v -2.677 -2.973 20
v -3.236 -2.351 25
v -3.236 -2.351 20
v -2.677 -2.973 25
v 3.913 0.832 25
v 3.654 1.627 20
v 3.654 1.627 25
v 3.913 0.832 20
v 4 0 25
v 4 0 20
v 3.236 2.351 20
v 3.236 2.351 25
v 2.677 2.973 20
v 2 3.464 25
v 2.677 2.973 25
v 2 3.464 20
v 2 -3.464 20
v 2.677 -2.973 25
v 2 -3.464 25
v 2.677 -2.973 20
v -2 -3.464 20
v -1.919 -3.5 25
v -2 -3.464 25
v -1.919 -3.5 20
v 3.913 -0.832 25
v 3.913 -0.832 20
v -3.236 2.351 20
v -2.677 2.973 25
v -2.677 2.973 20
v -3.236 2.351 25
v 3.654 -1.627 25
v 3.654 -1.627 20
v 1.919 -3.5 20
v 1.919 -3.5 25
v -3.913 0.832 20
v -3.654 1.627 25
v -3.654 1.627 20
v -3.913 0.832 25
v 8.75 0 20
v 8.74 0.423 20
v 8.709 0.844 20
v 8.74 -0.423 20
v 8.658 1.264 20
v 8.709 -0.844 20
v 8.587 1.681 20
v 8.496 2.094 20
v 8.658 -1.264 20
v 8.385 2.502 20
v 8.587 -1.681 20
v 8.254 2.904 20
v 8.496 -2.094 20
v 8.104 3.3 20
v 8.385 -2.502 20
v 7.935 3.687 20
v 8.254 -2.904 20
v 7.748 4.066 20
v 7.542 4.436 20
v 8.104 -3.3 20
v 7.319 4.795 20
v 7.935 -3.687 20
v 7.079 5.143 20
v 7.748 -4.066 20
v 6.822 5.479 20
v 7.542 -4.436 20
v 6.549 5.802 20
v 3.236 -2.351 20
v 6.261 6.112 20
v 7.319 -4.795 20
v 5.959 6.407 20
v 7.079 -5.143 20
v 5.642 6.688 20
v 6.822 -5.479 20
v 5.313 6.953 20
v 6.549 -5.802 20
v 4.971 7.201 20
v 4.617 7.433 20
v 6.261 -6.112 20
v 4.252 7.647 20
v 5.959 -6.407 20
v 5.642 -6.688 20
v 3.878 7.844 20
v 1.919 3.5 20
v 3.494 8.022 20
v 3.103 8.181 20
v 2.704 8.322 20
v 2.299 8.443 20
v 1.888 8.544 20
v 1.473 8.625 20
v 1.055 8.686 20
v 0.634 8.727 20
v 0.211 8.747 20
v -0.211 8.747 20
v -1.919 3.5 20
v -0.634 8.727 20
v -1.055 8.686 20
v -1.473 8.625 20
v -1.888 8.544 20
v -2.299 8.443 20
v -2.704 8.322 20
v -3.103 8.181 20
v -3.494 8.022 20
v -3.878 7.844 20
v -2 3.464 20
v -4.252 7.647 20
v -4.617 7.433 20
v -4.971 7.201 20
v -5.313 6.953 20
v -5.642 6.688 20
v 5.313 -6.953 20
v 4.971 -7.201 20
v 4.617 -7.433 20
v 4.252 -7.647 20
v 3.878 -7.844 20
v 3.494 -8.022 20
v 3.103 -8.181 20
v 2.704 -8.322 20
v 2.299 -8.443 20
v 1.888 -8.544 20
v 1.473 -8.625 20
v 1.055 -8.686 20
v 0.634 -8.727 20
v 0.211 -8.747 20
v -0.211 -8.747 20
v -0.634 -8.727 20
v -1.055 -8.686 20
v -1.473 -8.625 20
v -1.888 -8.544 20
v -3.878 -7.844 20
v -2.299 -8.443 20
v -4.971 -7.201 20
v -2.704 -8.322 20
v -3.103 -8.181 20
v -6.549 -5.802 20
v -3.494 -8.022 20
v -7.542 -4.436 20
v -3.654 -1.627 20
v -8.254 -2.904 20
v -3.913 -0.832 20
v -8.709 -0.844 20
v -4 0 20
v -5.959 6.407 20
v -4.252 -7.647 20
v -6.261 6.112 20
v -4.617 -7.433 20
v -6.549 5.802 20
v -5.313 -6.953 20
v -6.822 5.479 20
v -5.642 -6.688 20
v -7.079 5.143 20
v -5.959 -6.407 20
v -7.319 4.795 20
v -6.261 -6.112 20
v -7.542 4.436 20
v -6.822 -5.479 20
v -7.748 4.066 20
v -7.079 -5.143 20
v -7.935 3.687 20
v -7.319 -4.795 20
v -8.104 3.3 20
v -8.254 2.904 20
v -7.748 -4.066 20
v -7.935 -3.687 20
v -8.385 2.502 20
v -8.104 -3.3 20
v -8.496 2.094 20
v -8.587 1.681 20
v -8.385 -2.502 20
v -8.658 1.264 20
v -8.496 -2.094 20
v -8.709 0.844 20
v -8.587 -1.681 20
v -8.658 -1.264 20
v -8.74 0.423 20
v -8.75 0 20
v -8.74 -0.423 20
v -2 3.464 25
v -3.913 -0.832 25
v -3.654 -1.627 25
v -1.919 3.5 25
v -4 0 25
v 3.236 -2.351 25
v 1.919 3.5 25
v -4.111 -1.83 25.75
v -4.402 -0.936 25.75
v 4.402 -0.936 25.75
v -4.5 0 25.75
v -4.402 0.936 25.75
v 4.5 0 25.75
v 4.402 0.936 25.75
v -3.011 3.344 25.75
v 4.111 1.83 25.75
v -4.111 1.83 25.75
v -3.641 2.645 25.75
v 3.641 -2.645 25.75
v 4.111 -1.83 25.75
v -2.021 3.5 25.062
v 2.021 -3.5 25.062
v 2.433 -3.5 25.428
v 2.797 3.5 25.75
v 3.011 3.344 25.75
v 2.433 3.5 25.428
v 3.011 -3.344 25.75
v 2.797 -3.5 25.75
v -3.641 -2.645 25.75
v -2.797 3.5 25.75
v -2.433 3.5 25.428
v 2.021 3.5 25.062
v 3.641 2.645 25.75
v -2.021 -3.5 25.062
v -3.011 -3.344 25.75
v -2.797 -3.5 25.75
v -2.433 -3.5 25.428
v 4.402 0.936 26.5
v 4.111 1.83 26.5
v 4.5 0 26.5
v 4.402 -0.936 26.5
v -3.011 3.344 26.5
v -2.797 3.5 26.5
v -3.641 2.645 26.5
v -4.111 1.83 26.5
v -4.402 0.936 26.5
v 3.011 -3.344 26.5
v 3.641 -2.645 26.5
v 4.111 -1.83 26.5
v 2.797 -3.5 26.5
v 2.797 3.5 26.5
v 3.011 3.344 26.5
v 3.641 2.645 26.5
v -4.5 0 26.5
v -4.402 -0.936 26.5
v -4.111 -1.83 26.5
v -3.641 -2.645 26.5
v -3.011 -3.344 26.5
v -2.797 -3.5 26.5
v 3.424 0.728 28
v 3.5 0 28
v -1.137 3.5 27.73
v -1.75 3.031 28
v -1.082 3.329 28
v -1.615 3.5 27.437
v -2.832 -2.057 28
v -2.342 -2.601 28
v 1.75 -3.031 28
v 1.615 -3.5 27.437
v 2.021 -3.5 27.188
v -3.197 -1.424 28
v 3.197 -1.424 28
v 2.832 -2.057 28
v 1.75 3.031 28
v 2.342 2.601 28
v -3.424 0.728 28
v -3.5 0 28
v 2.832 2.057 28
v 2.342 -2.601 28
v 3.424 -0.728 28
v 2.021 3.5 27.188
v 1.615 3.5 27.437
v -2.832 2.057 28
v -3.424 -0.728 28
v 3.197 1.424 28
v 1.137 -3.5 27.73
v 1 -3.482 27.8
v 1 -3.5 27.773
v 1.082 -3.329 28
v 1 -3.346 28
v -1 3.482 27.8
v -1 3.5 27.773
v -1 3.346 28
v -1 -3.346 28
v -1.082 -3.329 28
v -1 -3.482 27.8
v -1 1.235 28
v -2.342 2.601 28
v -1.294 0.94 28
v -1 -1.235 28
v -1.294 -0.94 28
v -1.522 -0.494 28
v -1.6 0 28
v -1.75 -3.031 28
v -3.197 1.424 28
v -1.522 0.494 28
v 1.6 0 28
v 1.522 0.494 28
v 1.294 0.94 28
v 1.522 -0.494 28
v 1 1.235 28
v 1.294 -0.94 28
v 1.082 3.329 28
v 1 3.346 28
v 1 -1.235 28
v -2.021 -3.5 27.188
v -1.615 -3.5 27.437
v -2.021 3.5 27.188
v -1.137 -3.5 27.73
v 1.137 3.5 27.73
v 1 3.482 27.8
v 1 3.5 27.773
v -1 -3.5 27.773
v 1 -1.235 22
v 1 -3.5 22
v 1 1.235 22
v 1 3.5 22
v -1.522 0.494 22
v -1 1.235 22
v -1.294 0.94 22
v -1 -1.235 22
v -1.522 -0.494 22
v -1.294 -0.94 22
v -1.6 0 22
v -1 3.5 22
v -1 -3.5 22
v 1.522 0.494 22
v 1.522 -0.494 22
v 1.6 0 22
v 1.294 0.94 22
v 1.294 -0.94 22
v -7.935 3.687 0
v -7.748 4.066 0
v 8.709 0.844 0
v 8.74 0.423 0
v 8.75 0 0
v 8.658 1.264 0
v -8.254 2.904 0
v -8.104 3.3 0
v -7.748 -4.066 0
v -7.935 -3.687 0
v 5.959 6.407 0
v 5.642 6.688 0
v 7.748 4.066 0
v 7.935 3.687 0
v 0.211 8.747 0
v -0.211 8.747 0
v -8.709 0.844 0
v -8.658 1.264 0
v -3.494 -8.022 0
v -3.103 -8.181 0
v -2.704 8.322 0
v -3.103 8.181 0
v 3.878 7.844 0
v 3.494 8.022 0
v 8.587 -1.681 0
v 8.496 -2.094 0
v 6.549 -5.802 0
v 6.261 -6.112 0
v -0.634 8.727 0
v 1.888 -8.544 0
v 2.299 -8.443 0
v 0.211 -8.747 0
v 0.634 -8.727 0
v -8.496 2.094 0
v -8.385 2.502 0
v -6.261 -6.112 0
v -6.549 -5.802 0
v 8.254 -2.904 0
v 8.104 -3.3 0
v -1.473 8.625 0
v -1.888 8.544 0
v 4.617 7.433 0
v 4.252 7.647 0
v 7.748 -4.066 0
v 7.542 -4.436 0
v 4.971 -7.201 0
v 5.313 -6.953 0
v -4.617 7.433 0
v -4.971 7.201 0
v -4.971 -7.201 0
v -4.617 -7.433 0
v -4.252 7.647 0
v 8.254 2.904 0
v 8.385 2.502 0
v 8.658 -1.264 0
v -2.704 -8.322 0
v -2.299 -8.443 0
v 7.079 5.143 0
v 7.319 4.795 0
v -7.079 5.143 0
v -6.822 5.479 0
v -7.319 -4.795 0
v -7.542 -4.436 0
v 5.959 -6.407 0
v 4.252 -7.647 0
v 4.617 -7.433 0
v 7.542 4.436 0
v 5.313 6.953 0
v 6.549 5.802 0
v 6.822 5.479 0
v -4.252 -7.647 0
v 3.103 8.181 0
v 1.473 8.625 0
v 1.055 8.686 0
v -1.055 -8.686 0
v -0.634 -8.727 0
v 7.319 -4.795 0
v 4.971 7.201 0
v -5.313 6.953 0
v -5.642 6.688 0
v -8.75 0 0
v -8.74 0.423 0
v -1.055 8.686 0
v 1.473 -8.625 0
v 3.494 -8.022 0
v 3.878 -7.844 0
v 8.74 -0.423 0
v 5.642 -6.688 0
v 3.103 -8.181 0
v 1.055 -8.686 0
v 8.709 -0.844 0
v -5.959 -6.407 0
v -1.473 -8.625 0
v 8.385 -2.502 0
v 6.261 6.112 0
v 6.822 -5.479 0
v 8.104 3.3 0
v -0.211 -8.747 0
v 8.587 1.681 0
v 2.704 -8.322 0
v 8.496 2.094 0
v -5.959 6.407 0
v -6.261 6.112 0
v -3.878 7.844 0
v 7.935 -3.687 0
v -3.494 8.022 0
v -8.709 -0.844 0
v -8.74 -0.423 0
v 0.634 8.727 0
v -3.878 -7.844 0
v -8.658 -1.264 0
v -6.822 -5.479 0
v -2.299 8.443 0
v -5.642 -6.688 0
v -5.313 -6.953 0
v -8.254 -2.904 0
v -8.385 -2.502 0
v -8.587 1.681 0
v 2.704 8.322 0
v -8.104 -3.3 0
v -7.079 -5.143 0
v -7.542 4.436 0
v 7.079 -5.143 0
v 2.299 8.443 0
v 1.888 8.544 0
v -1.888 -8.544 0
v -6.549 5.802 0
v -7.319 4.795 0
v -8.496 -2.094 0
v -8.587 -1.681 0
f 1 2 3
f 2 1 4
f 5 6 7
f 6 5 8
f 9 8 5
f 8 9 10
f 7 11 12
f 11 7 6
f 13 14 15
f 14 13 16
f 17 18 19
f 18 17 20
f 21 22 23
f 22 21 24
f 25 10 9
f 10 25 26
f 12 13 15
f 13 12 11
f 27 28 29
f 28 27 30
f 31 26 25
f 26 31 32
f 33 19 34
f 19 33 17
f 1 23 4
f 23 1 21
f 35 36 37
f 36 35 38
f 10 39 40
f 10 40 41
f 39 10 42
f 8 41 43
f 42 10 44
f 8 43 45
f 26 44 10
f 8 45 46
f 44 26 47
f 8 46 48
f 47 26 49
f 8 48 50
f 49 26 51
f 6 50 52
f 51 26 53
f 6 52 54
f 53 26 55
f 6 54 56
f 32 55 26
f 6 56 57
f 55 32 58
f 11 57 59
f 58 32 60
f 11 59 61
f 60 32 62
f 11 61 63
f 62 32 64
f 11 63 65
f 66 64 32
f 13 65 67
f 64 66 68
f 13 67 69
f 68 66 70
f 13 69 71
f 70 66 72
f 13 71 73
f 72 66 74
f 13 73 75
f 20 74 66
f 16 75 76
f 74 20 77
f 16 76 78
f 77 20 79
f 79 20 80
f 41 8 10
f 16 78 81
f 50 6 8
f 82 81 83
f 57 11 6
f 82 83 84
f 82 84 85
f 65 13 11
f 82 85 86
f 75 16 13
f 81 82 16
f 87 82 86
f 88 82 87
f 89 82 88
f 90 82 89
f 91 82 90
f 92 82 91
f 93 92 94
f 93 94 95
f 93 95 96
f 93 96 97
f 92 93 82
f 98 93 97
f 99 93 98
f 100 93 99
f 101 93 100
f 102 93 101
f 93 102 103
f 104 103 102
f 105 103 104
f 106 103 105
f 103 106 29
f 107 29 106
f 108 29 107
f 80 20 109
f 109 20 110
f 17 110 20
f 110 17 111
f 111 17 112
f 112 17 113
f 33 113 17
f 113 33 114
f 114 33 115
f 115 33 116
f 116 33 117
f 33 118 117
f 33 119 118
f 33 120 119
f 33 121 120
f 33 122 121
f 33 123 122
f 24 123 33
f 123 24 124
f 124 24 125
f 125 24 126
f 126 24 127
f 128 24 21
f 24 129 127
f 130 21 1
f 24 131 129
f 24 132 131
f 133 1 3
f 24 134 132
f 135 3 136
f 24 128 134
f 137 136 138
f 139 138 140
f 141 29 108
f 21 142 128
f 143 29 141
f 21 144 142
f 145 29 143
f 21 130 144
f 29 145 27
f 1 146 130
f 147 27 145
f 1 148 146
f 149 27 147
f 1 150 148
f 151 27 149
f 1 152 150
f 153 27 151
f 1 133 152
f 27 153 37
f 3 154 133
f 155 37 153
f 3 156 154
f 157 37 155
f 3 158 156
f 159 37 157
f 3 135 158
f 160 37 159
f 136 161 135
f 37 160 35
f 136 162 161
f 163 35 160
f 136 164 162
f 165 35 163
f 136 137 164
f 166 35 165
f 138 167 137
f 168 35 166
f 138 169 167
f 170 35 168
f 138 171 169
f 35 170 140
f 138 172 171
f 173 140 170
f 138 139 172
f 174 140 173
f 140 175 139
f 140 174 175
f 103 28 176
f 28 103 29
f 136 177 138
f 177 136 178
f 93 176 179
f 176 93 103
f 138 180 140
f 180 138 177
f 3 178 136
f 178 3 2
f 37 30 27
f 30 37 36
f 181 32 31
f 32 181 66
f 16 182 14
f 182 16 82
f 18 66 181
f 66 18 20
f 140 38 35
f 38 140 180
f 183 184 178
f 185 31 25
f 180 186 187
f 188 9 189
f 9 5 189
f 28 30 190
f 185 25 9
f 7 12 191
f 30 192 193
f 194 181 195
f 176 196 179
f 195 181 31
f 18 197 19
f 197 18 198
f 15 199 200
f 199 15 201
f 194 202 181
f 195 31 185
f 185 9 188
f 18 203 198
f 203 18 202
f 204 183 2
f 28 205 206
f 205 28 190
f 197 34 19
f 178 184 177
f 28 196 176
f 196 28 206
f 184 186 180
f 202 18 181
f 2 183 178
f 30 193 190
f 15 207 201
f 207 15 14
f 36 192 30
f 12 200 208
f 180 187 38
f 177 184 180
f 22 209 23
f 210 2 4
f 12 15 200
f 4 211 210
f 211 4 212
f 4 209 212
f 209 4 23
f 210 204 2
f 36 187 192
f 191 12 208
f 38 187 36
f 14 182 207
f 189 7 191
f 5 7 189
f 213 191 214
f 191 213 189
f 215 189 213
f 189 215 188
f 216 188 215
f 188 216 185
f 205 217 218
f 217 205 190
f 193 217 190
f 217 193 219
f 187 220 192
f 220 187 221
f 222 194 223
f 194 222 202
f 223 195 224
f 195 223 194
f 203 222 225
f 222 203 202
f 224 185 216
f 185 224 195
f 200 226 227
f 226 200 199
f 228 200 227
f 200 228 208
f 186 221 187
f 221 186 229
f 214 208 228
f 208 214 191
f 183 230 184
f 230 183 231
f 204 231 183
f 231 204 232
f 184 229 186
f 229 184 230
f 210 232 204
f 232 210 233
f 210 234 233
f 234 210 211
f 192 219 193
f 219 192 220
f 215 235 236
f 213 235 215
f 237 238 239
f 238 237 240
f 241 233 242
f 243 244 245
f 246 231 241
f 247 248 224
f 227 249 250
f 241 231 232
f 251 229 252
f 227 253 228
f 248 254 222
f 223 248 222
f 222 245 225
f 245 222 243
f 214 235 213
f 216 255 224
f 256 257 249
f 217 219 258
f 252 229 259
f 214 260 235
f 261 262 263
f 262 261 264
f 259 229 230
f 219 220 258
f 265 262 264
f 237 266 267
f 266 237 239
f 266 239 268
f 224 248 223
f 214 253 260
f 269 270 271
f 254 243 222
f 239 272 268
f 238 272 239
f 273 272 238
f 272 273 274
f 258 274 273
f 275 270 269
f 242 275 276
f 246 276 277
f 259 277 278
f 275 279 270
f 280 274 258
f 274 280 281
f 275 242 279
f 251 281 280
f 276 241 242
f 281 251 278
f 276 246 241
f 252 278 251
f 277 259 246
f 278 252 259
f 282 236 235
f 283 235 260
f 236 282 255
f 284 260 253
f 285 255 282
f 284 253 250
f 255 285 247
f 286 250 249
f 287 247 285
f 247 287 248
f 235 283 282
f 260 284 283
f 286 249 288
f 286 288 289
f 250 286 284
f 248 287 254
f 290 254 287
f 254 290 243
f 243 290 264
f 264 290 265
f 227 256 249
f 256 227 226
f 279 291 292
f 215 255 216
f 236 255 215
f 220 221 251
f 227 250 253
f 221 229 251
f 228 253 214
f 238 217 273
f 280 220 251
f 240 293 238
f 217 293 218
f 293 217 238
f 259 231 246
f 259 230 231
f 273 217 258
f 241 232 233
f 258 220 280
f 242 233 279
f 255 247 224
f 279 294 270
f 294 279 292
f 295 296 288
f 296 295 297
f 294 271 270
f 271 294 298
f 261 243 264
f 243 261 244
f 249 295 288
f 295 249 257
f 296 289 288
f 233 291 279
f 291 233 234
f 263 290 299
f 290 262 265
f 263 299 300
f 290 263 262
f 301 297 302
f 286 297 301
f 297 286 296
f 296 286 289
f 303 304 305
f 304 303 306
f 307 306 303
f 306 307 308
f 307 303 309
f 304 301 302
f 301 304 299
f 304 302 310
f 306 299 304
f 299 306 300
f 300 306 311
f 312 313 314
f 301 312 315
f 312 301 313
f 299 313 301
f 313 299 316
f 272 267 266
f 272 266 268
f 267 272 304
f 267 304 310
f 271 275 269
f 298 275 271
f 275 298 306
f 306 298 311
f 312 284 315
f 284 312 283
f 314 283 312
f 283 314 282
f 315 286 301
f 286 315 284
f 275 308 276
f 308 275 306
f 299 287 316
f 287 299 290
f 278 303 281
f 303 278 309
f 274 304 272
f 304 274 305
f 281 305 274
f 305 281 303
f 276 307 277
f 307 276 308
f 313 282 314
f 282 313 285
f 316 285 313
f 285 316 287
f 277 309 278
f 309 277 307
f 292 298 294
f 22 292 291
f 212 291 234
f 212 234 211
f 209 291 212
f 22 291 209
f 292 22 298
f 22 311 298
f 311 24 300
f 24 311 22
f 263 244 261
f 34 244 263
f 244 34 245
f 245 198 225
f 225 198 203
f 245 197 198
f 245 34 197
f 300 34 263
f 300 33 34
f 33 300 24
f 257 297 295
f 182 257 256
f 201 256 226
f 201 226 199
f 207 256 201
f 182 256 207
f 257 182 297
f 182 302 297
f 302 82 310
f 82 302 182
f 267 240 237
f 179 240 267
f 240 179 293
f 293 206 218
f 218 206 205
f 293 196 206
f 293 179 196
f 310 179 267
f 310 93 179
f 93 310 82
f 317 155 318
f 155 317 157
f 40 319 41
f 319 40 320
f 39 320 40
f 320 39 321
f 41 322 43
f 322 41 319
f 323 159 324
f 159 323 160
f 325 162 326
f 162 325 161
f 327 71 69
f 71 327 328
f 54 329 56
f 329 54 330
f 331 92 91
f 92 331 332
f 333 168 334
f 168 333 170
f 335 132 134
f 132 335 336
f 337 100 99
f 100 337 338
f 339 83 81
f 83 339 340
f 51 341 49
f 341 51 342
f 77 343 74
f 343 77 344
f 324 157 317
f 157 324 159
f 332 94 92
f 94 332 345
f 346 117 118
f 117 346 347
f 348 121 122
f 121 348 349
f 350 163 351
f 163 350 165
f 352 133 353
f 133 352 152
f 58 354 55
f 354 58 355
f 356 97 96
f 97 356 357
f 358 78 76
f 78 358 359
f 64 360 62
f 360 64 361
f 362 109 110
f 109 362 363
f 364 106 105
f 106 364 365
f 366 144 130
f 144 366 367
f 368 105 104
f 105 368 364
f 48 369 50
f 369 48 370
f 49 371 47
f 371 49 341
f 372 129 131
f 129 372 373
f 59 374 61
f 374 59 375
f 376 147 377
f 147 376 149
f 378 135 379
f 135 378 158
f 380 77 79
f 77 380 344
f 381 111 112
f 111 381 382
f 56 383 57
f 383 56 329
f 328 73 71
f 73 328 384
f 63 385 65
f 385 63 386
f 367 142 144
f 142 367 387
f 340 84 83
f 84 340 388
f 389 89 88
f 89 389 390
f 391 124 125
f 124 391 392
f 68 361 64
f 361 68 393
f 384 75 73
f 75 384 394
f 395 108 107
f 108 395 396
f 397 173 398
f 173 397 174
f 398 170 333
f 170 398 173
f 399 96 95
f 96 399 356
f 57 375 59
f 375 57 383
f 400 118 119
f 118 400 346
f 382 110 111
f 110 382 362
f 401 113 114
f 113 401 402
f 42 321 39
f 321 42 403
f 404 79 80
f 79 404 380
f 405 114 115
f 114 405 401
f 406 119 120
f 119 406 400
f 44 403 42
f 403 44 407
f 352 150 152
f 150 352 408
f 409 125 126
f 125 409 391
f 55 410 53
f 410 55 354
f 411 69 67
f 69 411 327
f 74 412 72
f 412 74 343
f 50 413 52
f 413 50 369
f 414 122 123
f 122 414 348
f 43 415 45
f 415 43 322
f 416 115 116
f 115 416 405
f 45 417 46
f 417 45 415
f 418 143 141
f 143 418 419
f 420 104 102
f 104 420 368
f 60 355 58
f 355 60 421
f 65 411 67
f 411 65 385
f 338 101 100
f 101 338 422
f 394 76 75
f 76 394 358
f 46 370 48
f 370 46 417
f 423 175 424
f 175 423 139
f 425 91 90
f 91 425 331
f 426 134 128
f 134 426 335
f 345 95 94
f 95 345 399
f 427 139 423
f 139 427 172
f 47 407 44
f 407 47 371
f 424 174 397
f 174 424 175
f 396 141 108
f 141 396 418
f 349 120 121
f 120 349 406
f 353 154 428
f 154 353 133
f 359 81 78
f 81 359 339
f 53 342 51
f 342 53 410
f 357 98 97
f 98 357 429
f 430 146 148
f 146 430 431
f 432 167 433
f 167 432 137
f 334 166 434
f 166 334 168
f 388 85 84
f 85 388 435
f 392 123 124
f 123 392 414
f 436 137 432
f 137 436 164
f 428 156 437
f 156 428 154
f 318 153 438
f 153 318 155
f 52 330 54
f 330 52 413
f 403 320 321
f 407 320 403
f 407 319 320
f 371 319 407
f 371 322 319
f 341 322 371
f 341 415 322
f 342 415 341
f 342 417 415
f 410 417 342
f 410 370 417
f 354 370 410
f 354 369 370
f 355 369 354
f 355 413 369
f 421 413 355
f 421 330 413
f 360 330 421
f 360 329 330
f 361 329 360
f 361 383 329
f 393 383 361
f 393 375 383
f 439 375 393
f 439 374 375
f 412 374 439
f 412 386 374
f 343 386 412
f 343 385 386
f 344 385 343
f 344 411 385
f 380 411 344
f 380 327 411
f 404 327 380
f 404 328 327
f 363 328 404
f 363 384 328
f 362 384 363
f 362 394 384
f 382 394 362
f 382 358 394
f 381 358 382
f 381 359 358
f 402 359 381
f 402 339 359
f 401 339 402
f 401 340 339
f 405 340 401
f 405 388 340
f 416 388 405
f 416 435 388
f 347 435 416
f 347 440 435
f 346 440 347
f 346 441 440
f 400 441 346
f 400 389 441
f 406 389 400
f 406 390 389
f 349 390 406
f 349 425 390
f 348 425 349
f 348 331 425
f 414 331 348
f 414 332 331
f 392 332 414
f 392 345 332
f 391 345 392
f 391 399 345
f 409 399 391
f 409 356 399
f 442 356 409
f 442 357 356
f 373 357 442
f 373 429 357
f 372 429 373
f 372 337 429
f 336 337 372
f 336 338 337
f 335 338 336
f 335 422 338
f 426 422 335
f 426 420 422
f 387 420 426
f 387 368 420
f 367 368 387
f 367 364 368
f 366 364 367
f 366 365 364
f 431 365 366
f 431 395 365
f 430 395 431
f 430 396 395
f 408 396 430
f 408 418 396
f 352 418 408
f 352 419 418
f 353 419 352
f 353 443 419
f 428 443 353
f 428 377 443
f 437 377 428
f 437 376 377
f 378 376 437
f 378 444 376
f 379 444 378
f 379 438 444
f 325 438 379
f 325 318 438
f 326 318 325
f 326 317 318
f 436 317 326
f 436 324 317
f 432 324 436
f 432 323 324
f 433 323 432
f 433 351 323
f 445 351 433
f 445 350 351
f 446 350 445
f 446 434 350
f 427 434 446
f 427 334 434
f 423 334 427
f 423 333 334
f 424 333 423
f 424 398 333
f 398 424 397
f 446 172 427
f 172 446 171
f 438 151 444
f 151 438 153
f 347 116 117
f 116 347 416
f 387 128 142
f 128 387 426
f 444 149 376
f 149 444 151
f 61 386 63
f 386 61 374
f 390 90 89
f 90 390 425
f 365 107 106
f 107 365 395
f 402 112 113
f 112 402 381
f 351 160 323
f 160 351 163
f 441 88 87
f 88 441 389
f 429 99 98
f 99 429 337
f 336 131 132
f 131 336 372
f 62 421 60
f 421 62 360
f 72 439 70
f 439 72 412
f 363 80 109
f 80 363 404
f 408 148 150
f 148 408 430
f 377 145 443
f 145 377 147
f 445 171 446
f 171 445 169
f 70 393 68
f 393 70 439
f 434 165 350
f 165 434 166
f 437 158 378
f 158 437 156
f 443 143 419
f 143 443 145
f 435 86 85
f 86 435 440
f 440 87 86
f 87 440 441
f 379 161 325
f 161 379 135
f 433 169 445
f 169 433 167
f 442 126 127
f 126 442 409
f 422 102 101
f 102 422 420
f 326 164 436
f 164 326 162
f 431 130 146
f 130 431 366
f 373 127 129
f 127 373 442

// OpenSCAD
$fn=130;

pinR=8.75;      //Zylinder-Radius
pinH=20;        //Zylinder-Höhe
pintack(h=8);   //Pin-Höhe


module pin(h=10, r=4, lh=3, lt=1) { 
    pin_vertical(h, r, lh, lt);
}

module pintack(h=10, r=4, lh=3, lt=1, bh=pinH, br=pinR) {
   union() {
    cylinder(h=bh, r=br);
    translate([0, 0, bh]) pin(h, r, lh, lt);
  }
}

module pin_vertical(h=10, r=4, lh=3, lt=1) {

  difference() {
    pin_solid(h, r, lh, lt);
    translate([-r*0.5/2, -(r*2+lt*2)/2, h/4]) cube([r*0.5, r*2+lt*2, h]);
    translate([0, 0, h/4]) cylinder(h=h+lh, r=r/2.5, $fn=20);
    translate([-r*2, -lt-r*1.125, -1]) cube([r*4, lt*2, h+2]);
    translate([-r*2, -lt+r*1.125, -1]) cube([r*4, lt*2, h+2]);
  }
}

module pin_solid(h=10, r=4, lh=3, lt=1) {
  union() {

    cylinder(h=h-lh, r=r, $fn=30);
    translate([0, 0, h-lh]) cylinder(h=lh*0.25, r1=r, r2=r+(lt/2), $fn=30);
    translate([0, 0, h-lh+lh*0.25]) cylinder(h=lh*0.25, r=r+(lt/2), $fn=30);    
    translate([0, 0, h-lh+lh*0.50]) cylinder(h=lh*0.50, r1=r+(lt/2), r2=r-(lt/2), $fn=30);    
  }
}
